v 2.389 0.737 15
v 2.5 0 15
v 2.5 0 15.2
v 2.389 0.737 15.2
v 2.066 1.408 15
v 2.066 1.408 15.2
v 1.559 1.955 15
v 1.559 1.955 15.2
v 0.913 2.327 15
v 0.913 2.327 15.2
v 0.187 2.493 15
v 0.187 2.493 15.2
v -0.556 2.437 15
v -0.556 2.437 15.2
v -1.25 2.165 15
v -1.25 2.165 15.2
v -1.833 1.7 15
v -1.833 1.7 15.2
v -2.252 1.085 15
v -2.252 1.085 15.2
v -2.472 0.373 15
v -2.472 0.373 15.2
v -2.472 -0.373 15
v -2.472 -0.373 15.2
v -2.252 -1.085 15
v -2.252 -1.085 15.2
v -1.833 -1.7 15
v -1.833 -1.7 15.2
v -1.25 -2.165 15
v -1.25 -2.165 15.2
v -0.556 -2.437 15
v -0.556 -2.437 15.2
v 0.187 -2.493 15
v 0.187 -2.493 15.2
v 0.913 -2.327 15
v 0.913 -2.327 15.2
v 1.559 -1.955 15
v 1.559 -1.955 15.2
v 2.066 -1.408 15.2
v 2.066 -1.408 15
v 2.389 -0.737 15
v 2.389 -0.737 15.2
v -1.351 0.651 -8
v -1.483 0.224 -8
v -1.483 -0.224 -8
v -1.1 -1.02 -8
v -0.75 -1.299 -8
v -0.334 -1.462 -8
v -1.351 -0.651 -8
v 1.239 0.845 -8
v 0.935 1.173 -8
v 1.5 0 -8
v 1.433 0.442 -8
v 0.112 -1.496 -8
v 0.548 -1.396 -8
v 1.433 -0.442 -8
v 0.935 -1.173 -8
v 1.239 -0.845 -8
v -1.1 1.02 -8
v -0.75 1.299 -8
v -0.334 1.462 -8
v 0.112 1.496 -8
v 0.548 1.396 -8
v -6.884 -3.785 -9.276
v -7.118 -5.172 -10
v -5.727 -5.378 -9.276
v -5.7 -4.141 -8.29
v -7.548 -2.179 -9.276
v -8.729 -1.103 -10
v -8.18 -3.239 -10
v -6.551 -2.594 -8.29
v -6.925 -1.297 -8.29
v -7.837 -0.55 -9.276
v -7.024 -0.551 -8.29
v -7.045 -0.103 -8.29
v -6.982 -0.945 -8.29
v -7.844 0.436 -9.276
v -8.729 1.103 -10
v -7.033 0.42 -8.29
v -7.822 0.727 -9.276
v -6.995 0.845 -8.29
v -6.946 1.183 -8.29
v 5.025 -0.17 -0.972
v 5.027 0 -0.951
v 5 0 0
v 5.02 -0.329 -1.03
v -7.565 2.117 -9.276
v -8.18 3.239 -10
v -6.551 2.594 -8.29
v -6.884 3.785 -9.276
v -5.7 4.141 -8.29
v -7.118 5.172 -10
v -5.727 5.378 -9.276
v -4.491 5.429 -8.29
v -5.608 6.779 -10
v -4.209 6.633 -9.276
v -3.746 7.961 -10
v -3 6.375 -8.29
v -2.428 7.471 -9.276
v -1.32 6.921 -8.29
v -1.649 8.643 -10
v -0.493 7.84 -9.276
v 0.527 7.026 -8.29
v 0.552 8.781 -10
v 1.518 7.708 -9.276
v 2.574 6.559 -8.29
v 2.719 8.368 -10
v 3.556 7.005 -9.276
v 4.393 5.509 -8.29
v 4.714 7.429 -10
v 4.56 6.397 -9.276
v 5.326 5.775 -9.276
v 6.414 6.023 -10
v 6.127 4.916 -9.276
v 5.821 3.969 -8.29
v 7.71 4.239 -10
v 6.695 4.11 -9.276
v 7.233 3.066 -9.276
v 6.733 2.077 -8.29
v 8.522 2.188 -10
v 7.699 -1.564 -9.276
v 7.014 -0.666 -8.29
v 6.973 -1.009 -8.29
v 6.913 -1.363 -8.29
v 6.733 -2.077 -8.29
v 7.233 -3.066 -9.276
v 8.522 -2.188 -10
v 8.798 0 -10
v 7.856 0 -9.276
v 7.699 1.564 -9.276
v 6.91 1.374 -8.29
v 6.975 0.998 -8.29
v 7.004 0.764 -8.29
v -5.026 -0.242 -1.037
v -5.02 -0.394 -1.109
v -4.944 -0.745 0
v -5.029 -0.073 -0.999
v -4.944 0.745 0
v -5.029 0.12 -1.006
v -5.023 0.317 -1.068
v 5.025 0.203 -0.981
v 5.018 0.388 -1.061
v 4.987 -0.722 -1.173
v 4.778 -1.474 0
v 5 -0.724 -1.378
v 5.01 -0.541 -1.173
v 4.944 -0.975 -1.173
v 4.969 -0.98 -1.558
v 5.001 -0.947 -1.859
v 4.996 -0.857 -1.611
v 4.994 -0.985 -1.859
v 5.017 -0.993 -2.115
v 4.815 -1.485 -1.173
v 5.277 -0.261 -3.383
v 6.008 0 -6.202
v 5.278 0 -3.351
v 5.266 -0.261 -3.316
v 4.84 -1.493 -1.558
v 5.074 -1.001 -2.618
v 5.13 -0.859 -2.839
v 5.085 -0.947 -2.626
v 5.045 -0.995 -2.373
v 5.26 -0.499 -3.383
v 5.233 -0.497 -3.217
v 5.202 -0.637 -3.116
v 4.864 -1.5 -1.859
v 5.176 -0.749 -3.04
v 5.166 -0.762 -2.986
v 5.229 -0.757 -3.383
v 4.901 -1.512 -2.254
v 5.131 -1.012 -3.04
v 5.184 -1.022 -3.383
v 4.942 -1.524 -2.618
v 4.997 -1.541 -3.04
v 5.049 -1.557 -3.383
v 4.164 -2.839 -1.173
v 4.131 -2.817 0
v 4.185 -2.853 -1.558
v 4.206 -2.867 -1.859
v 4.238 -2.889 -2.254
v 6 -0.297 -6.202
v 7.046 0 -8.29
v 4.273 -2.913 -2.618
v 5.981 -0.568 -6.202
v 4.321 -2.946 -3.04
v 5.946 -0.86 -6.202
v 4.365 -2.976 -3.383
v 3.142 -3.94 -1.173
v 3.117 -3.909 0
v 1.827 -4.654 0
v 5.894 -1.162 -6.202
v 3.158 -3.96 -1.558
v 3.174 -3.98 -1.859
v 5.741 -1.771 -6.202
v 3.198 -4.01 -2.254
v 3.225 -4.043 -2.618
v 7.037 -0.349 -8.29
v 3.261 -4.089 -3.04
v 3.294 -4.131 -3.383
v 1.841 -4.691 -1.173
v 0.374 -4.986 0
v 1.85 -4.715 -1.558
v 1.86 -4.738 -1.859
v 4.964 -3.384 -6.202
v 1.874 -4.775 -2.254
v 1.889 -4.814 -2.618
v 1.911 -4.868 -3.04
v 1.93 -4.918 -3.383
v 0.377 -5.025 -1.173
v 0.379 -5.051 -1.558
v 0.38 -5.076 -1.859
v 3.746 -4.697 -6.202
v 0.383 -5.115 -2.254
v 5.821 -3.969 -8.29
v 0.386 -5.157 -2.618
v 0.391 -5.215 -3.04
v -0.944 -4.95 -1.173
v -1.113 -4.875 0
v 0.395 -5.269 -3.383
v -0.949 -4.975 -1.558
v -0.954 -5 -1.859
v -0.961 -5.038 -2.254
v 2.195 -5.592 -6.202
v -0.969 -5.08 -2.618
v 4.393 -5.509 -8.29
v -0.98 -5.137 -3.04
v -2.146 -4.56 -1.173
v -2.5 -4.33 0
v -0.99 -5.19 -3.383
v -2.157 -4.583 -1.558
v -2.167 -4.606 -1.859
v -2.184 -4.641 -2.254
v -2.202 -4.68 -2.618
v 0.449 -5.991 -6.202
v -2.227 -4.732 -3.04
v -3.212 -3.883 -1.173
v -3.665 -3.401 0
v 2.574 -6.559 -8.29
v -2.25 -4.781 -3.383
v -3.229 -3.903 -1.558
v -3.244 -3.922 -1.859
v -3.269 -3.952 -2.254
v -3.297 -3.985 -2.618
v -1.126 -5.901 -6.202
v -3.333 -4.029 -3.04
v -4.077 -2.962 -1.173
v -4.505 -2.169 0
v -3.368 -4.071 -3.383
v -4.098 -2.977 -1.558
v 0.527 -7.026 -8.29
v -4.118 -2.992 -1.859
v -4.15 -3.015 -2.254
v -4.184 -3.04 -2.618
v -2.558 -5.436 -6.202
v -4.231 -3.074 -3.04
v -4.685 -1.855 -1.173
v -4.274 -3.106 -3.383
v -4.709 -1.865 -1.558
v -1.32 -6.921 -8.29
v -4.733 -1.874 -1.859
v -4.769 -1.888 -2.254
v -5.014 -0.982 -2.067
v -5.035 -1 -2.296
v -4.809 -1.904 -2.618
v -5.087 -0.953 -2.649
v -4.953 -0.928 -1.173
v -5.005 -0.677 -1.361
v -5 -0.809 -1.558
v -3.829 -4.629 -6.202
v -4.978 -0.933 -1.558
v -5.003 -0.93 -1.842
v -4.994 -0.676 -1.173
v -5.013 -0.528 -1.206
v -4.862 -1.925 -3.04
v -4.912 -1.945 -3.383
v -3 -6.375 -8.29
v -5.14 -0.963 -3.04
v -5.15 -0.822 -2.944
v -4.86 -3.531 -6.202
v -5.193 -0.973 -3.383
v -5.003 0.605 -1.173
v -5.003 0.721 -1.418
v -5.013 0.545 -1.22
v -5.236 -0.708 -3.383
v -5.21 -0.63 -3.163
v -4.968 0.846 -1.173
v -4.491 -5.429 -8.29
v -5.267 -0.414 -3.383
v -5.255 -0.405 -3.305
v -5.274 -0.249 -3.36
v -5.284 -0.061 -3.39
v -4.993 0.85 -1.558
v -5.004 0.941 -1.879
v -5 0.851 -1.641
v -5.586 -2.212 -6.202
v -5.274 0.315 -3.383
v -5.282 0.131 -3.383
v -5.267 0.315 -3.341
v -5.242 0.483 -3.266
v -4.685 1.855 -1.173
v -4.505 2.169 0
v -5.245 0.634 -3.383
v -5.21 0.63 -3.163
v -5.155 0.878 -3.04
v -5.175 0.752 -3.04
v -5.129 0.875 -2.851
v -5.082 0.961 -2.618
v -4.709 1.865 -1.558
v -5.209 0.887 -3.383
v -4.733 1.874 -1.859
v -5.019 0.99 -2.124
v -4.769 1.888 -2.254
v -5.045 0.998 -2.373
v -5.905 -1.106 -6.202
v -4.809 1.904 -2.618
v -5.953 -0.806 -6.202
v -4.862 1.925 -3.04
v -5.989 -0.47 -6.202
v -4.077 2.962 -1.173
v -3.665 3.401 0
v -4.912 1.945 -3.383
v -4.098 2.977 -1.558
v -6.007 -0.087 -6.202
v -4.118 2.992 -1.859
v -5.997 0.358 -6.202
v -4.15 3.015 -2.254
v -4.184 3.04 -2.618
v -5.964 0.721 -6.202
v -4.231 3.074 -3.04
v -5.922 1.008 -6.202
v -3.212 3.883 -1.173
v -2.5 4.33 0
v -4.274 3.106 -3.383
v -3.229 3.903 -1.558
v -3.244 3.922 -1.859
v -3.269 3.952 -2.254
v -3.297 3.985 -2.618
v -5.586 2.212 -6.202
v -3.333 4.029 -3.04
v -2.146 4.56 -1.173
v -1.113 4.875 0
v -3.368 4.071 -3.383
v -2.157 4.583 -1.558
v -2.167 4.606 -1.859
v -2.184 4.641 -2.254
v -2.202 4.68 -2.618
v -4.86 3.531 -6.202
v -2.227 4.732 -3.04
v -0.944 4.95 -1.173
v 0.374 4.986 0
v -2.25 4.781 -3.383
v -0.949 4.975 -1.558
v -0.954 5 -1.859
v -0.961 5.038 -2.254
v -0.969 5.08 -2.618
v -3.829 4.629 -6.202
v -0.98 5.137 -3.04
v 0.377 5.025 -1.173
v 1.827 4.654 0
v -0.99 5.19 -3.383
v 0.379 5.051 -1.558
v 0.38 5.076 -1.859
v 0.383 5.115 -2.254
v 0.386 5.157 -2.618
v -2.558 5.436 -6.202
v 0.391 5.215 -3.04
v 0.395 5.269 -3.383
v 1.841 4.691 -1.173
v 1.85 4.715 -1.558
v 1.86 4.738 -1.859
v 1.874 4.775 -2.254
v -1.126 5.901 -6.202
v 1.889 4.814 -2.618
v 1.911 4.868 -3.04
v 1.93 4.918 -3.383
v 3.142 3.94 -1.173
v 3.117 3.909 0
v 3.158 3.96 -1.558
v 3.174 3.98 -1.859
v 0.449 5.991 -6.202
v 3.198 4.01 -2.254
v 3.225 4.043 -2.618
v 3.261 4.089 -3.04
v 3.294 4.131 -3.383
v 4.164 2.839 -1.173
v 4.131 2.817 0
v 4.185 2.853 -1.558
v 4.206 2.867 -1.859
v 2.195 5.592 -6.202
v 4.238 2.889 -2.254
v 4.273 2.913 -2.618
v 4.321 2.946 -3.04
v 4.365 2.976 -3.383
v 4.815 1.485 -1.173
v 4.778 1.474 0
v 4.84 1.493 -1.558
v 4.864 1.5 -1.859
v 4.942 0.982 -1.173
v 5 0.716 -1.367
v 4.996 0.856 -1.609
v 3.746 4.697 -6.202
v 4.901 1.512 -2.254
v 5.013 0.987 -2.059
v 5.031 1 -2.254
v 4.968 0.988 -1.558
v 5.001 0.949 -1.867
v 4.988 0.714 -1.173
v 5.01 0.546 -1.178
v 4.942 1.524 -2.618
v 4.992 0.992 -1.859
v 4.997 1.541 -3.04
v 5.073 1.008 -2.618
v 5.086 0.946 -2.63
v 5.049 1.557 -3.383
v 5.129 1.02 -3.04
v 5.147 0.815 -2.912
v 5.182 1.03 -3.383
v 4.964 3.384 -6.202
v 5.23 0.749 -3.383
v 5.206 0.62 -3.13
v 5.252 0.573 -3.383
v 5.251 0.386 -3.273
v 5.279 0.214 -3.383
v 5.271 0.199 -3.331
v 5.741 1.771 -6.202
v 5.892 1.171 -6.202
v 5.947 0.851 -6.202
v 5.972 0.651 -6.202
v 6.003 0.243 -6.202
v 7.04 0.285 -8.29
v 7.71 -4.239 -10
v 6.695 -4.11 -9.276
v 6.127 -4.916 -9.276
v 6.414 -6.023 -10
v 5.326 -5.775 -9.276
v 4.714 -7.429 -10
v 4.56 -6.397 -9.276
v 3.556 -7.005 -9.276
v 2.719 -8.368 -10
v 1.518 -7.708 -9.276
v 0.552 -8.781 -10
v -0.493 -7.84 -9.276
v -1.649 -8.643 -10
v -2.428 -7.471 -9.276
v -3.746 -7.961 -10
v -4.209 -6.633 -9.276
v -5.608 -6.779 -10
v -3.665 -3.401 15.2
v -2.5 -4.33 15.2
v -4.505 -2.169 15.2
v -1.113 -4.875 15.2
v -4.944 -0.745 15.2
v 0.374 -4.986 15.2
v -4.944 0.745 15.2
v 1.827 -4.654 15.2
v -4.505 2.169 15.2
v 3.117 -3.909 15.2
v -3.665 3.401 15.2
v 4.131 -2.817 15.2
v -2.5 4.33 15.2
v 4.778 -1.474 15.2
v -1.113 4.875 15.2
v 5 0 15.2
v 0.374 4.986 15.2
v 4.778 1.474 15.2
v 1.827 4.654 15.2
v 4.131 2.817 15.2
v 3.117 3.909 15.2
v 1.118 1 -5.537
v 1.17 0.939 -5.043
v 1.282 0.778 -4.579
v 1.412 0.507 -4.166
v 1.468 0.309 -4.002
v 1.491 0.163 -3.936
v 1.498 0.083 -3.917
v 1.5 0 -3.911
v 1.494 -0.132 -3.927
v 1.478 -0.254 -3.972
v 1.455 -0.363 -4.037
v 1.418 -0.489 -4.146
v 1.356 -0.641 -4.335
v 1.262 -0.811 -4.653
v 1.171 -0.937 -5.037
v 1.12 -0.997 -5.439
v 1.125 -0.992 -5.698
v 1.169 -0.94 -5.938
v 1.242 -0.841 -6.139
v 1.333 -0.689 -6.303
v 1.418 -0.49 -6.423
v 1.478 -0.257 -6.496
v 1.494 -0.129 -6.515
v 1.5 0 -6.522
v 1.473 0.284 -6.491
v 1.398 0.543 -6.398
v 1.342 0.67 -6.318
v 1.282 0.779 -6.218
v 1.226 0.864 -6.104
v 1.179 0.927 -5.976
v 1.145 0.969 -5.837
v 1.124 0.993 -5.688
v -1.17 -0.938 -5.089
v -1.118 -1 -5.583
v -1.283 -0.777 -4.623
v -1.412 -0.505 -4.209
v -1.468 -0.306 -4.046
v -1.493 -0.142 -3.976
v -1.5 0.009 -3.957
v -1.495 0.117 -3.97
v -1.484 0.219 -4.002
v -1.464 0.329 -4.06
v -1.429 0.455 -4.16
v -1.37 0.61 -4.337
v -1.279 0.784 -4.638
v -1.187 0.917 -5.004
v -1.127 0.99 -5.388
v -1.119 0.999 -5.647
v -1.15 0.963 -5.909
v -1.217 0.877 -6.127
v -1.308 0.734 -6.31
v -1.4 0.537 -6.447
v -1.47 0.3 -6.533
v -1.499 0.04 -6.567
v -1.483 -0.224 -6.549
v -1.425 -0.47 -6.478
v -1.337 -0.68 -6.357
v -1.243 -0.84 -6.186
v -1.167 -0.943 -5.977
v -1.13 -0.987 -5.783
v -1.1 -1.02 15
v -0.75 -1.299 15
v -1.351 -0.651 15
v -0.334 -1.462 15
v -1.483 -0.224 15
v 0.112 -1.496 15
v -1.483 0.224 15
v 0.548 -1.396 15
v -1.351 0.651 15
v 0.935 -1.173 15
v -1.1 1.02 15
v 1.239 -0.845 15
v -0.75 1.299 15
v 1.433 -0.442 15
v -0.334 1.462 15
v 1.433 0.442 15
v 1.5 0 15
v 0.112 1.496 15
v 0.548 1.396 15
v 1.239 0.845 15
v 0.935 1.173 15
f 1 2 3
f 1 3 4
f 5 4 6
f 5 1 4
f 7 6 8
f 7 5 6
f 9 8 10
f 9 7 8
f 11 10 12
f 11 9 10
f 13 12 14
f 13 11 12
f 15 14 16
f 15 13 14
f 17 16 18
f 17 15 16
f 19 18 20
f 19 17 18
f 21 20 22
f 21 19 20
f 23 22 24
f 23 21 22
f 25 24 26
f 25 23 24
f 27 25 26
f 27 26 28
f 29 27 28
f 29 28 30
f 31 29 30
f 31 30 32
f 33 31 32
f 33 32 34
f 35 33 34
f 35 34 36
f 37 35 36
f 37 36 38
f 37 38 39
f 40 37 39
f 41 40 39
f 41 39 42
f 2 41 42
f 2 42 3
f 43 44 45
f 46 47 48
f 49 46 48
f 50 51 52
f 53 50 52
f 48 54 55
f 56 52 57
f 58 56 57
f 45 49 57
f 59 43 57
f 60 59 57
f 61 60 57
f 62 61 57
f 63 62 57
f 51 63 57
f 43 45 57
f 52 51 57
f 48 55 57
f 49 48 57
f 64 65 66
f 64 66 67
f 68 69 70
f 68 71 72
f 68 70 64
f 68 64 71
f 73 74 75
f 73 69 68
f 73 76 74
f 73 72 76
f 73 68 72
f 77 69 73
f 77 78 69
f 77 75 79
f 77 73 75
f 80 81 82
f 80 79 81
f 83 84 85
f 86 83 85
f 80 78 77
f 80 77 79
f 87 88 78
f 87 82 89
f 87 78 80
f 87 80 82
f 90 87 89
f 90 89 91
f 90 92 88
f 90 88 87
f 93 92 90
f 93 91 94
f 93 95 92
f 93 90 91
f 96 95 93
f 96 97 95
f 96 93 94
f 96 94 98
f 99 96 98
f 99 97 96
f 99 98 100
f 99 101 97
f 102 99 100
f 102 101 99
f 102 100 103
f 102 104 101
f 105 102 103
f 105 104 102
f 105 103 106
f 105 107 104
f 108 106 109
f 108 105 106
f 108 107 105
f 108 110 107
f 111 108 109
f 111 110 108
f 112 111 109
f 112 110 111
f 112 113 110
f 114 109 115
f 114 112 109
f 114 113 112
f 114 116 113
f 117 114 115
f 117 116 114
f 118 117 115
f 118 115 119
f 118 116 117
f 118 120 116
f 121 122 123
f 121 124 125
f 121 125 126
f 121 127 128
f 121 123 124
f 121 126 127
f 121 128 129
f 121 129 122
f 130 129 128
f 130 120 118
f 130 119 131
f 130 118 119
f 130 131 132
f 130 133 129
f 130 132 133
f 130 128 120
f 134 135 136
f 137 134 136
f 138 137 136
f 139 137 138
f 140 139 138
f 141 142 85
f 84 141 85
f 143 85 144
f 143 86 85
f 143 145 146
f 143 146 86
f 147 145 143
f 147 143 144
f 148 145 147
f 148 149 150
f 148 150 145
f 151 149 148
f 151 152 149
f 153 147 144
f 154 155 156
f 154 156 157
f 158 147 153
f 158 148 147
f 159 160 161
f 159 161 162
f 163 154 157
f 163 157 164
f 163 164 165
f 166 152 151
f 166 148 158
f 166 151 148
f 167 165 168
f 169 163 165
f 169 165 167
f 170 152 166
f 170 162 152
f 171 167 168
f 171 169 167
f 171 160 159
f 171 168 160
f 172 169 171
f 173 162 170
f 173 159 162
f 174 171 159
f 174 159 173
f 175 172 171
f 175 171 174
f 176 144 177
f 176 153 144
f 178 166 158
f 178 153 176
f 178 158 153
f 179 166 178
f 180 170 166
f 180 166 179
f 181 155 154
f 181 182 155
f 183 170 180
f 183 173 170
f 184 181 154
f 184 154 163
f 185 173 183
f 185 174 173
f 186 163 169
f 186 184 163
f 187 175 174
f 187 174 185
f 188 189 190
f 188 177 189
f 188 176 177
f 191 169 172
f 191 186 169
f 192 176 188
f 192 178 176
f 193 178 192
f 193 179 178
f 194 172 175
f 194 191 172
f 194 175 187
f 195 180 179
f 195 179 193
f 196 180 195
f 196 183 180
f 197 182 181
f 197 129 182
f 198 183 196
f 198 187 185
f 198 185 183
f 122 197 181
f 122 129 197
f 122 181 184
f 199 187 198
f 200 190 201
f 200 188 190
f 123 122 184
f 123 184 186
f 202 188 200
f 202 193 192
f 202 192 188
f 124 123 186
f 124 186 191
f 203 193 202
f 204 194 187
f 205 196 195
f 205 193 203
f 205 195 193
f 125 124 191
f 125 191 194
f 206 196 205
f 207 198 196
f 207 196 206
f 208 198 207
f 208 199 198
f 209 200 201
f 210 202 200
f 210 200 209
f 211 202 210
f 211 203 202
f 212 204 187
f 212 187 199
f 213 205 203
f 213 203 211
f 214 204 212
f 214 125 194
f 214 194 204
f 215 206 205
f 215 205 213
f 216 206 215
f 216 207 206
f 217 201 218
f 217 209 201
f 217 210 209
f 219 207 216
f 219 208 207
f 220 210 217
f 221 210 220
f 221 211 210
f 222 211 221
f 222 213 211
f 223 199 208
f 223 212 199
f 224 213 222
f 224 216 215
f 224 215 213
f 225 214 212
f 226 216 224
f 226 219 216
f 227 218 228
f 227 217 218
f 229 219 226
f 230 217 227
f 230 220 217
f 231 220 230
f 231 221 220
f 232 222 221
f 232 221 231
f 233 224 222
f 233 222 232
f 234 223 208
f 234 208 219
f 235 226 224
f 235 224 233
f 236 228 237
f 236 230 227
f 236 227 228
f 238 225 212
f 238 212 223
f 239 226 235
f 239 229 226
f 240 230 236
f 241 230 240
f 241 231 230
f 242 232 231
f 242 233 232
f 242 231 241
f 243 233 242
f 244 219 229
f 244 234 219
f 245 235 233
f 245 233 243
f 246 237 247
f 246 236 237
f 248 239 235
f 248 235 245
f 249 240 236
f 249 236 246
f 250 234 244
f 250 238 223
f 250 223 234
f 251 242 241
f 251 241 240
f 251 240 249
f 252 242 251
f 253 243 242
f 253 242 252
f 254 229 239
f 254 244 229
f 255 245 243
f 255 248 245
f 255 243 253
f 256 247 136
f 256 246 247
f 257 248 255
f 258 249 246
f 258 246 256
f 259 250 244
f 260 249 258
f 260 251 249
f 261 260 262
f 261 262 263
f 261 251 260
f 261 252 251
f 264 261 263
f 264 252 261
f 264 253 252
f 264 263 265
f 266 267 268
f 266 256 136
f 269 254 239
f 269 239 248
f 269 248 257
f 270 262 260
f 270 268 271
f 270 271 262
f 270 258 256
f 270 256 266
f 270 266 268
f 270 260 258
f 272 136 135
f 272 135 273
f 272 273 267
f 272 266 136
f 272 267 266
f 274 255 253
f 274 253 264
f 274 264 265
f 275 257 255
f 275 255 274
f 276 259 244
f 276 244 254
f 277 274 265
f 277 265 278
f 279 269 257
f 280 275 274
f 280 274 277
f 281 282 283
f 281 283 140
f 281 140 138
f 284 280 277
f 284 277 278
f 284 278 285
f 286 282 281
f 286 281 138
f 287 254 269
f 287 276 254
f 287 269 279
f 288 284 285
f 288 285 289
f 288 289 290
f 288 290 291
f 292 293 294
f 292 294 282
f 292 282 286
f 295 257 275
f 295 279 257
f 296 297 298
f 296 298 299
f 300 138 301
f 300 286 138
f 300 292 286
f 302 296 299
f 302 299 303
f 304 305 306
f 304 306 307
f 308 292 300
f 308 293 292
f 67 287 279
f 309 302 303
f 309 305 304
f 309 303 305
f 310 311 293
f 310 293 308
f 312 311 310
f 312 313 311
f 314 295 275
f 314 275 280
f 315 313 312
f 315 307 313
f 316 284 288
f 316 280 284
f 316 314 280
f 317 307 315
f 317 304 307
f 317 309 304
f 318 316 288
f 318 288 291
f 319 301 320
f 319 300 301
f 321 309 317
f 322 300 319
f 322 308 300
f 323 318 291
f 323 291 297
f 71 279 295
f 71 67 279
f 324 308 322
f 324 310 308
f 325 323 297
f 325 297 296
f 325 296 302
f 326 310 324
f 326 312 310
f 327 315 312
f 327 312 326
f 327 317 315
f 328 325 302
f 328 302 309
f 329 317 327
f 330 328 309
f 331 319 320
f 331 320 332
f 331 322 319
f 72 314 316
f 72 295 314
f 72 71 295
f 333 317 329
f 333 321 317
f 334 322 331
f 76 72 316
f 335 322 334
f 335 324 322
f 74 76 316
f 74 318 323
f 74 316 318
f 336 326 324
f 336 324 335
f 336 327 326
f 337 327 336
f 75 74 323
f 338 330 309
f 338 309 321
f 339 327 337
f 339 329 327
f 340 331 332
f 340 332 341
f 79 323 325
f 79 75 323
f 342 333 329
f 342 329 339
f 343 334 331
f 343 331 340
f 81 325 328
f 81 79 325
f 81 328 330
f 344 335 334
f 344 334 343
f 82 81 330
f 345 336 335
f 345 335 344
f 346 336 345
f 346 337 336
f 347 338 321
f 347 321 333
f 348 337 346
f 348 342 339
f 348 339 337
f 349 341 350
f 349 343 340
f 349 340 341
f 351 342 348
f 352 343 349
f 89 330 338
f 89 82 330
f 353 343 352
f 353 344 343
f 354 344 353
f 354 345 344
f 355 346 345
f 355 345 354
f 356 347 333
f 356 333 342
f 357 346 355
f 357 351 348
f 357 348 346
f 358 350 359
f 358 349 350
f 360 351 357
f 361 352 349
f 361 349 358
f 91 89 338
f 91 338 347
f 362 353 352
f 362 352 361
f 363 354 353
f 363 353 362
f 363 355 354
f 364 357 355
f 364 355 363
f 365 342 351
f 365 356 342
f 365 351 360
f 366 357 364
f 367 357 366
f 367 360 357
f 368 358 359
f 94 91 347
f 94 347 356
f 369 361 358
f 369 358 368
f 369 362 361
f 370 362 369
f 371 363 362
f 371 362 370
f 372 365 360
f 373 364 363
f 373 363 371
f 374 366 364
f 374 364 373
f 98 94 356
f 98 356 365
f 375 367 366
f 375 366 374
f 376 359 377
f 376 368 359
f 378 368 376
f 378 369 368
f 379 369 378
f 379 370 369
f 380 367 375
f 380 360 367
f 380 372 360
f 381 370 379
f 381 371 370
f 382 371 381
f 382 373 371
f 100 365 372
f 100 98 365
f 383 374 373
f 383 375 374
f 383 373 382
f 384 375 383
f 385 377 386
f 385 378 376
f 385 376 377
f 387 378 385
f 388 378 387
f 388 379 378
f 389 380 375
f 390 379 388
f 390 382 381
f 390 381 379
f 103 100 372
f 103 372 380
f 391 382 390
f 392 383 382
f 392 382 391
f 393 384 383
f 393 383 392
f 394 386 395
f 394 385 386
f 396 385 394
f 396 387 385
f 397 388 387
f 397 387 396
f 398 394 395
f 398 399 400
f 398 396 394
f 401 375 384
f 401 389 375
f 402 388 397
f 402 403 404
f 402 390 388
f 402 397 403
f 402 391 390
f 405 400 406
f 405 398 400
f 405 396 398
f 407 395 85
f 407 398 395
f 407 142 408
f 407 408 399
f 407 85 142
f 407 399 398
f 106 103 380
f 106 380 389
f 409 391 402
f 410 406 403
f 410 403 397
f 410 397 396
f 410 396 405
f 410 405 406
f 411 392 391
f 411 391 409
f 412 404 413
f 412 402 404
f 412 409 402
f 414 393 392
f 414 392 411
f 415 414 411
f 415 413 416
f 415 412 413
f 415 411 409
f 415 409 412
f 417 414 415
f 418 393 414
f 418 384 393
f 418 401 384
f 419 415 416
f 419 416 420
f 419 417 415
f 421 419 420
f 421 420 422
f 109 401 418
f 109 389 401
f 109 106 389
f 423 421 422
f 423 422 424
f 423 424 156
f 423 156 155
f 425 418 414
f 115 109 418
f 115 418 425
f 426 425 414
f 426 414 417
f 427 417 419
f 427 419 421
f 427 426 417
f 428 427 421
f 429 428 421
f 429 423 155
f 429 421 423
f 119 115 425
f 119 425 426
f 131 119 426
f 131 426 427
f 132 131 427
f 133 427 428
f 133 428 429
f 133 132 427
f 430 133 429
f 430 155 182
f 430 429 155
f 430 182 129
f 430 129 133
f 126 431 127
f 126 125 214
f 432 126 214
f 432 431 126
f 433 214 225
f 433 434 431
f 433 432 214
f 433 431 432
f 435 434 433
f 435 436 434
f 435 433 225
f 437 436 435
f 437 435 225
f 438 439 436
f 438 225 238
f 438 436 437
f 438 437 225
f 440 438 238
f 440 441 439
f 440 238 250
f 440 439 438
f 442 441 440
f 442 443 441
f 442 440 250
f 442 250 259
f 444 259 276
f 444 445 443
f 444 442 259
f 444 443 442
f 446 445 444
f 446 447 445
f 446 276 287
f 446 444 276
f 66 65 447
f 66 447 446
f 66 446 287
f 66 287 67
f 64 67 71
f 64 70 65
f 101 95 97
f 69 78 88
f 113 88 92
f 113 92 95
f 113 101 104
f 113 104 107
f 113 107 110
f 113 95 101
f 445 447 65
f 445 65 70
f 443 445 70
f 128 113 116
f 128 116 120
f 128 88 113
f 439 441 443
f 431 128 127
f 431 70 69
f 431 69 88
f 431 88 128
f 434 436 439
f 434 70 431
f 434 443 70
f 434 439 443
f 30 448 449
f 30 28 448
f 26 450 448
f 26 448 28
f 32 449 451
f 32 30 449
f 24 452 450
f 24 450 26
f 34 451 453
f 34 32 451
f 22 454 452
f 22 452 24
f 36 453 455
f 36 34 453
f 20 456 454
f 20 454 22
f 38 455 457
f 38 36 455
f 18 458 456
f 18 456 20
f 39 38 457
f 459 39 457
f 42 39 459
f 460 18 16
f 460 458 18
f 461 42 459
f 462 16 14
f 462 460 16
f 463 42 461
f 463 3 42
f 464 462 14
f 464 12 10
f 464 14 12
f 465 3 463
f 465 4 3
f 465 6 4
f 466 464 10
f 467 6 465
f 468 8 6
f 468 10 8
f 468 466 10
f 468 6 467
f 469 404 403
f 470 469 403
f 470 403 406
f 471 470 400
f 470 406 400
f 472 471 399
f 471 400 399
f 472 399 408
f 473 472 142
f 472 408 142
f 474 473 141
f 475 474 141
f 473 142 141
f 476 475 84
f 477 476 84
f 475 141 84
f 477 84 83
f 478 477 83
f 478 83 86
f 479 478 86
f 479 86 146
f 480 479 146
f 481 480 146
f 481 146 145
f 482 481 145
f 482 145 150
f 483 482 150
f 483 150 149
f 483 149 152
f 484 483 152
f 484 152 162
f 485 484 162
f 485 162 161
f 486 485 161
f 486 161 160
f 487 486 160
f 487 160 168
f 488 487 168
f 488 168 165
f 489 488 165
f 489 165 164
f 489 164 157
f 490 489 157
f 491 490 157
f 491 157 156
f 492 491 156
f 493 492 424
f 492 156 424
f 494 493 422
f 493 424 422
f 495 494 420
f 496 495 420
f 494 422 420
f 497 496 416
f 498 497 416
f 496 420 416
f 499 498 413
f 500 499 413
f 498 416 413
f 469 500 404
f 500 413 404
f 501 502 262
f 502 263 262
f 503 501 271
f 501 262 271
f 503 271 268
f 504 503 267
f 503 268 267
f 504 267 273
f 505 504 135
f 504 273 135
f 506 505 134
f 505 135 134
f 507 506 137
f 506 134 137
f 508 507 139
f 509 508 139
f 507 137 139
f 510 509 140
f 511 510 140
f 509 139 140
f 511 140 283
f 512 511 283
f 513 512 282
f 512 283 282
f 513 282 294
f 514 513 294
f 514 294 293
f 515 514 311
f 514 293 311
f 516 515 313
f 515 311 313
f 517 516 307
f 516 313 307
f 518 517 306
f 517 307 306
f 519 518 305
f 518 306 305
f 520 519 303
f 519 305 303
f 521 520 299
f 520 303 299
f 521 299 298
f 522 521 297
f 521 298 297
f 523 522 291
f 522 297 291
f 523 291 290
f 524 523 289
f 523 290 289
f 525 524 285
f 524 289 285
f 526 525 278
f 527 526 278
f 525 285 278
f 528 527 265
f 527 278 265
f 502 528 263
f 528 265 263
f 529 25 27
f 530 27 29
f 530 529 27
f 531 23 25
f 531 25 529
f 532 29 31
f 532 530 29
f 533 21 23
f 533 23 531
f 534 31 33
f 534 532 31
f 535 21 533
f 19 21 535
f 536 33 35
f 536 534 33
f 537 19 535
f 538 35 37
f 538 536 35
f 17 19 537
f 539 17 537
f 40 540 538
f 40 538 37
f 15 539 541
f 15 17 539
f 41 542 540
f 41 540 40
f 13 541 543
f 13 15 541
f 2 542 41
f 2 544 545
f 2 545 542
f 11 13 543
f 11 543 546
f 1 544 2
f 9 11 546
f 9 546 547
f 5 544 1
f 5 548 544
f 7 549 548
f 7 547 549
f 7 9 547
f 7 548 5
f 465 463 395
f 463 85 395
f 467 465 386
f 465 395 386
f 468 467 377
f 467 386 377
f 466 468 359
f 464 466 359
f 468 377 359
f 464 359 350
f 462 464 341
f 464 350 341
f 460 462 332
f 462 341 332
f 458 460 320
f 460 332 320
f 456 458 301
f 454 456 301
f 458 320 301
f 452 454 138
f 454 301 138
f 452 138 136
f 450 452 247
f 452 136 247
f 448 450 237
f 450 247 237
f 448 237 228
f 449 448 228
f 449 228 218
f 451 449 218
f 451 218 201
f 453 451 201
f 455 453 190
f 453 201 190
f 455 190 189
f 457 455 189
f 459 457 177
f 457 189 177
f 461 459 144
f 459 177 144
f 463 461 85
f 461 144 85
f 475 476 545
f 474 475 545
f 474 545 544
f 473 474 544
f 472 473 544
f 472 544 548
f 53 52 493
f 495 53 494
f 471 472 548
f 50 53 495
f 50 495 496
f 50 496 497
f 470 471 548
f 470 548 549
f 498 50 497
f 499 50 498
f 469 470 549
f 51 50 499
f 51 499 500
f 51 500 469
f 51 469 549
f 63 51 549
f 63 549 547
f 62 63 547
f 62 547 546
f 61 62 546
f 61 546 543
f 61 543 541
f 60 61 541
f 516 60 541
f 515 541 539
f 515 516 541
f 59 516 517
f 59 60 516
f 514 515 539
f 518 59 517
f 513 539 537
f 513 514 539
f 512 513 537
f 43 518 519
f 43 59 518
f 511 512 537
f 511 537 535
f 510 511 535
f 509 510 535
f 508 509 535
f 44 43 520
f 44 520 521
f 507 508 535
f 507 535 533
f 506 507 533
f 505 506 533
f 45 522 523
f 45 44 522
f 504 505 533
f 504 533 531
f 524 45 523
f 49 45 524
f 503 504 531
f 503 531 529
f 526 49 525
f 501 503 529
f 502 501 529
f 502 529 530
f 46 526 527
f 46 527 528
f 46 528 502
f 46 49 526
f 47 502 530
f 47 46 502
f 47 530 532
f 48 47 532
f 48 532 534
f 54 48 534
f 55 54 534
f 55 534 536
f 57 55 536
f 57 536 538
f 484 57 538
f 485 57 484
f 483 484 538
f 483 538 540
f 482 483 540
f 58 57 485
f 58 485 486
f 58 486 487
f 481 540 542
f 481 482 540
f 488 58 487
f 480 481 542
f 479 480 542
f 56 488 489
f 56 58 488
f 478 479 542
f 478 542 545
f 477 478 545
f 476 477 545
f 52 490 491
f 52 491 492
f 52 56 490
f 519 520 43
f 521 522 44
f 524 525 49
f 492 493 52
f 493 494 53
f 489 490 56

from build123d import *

# Parameters (mm, degrees)
F0_R          = 2.5
F0_R_2        = 1.5
F4_DEPTH      = 15
F4_DEPTH_BACK = 10
F6_R          = 2.55
F6_R_2        = 2.5
F7_DEPTH      = 0.25
F10_R         = 5
F10_R_2       = 1.5
F11_DEPTH     = 1.2
F14_R         = 1.5
F15_DEPTH     = 2
F3_R          = 1
F18_R         = 1
F20_DEPTH     = 14


with BuildPart() as f4:
    # F0 (on Top) → F4 (new body, two sides)
    with BuildSketch(Plane.XY) as f4_sk:
        Circle(F0_R)
        Circle(F0_R_2, mode=Mode.SUBTRACT)
    extrude(amount=F4_DEPTH)
    extrude(f4_sk.sketch, amount=-F4_DEPTH_BACK)

    # F6 (on face) → F7 (join)
    with BuildSketch(Plane.XY.offset(15)):
        Circle(F6_R)
        Circle(F6_R_2, mode=Mode.SUBTRACT)
    extrude(amount=-F7_DEPTH)

    # F10 (on Top) → F11 (join)
    with BuildSketch(Plane.XY):
        Circle(F10_R)
        Circle(F10_R_2, mode=Mode.SUBTRACT)
    extrude(amount=F11_DEPTH)

    # F12 (on Front) → F13 (revolve)
    with BuildSketch(Plane.XZ):
        with BuildLine():
            Line((5, 0), (2.5, 0))
            Line((2.5, 0), (2.5, -10))
            Line((2.5, -10), (8.7983487174, -10))
            add(Edge.make_bspline(
                [(5, 0), (5.0383992493, -4.4832699932), (6.3285781071, -8.5749803111), (8.7983487174, -10)],
                knots=[0, 0, 0, 0, 10.6970768427, 10.6970768427, 10.6970768427, 10.6970768427], degree=3))
        make_face()
    revolve(axis=Axis((0, 0, -7.6235234737), (0, 0, -1)))

    # F14 (on face) → F15 (join)
    with BuildSketch(Plane(origin=(0, 0, -10), x_dir=(1, 0, 0), z_dir=(0, 0, -1))):
        Circle(F14_R)
    extrude(amount=-F15_DEPTH)

    # F16: sweep along a path in F1
    with BuildLine(Plane.XZ) as f16_path:
        Line((0, -6.4742463656), (7.6604444312, -0.0463702687))
    # F3 (on line) → F16 (sweep, cut)
    with BuildSketch(Plane(origin=(4.4725004233, 0, 3.7528734556), x_dir=(0, 1, 0), z_dir=(0.7660444431, 0, 0.6427876097))):
        with Locations((0, -4.96)):
            Circle(F3_R)
    sweep(path=f16_path.line, mode=Mode.SUBTRACT)

    # F19: sweep along a path in F1
    with BuildLine(Plane.XZ) as f19_path:
        Line((0, -6.4742463656), (-7.6604444312, -0.0463702687))
    # F18 (on line) → F19 (sweep, cut)
    with BuildSketch(Plane(origin=(-4.4725004233, 0, 3.7528734556), x_dir=(0, -1, 0), z_dir=(-0.7660444431, 0, 0.6427876097))):
        with Locations((0, -4.9955216867)):
            Circle(F18_R)
    sweep(path=f19_path.line, mode=Mode.SUBTRACT)

    # F20 (add): a face of the model
    f20_faces = [f4.faces().sort_by_distance(p)[0] for p in [
        (-4.8585786438, 0, 1.2),
    ]]
    extrude(f20_faces, amount=F20_DEPTH)


solid = f4.part
